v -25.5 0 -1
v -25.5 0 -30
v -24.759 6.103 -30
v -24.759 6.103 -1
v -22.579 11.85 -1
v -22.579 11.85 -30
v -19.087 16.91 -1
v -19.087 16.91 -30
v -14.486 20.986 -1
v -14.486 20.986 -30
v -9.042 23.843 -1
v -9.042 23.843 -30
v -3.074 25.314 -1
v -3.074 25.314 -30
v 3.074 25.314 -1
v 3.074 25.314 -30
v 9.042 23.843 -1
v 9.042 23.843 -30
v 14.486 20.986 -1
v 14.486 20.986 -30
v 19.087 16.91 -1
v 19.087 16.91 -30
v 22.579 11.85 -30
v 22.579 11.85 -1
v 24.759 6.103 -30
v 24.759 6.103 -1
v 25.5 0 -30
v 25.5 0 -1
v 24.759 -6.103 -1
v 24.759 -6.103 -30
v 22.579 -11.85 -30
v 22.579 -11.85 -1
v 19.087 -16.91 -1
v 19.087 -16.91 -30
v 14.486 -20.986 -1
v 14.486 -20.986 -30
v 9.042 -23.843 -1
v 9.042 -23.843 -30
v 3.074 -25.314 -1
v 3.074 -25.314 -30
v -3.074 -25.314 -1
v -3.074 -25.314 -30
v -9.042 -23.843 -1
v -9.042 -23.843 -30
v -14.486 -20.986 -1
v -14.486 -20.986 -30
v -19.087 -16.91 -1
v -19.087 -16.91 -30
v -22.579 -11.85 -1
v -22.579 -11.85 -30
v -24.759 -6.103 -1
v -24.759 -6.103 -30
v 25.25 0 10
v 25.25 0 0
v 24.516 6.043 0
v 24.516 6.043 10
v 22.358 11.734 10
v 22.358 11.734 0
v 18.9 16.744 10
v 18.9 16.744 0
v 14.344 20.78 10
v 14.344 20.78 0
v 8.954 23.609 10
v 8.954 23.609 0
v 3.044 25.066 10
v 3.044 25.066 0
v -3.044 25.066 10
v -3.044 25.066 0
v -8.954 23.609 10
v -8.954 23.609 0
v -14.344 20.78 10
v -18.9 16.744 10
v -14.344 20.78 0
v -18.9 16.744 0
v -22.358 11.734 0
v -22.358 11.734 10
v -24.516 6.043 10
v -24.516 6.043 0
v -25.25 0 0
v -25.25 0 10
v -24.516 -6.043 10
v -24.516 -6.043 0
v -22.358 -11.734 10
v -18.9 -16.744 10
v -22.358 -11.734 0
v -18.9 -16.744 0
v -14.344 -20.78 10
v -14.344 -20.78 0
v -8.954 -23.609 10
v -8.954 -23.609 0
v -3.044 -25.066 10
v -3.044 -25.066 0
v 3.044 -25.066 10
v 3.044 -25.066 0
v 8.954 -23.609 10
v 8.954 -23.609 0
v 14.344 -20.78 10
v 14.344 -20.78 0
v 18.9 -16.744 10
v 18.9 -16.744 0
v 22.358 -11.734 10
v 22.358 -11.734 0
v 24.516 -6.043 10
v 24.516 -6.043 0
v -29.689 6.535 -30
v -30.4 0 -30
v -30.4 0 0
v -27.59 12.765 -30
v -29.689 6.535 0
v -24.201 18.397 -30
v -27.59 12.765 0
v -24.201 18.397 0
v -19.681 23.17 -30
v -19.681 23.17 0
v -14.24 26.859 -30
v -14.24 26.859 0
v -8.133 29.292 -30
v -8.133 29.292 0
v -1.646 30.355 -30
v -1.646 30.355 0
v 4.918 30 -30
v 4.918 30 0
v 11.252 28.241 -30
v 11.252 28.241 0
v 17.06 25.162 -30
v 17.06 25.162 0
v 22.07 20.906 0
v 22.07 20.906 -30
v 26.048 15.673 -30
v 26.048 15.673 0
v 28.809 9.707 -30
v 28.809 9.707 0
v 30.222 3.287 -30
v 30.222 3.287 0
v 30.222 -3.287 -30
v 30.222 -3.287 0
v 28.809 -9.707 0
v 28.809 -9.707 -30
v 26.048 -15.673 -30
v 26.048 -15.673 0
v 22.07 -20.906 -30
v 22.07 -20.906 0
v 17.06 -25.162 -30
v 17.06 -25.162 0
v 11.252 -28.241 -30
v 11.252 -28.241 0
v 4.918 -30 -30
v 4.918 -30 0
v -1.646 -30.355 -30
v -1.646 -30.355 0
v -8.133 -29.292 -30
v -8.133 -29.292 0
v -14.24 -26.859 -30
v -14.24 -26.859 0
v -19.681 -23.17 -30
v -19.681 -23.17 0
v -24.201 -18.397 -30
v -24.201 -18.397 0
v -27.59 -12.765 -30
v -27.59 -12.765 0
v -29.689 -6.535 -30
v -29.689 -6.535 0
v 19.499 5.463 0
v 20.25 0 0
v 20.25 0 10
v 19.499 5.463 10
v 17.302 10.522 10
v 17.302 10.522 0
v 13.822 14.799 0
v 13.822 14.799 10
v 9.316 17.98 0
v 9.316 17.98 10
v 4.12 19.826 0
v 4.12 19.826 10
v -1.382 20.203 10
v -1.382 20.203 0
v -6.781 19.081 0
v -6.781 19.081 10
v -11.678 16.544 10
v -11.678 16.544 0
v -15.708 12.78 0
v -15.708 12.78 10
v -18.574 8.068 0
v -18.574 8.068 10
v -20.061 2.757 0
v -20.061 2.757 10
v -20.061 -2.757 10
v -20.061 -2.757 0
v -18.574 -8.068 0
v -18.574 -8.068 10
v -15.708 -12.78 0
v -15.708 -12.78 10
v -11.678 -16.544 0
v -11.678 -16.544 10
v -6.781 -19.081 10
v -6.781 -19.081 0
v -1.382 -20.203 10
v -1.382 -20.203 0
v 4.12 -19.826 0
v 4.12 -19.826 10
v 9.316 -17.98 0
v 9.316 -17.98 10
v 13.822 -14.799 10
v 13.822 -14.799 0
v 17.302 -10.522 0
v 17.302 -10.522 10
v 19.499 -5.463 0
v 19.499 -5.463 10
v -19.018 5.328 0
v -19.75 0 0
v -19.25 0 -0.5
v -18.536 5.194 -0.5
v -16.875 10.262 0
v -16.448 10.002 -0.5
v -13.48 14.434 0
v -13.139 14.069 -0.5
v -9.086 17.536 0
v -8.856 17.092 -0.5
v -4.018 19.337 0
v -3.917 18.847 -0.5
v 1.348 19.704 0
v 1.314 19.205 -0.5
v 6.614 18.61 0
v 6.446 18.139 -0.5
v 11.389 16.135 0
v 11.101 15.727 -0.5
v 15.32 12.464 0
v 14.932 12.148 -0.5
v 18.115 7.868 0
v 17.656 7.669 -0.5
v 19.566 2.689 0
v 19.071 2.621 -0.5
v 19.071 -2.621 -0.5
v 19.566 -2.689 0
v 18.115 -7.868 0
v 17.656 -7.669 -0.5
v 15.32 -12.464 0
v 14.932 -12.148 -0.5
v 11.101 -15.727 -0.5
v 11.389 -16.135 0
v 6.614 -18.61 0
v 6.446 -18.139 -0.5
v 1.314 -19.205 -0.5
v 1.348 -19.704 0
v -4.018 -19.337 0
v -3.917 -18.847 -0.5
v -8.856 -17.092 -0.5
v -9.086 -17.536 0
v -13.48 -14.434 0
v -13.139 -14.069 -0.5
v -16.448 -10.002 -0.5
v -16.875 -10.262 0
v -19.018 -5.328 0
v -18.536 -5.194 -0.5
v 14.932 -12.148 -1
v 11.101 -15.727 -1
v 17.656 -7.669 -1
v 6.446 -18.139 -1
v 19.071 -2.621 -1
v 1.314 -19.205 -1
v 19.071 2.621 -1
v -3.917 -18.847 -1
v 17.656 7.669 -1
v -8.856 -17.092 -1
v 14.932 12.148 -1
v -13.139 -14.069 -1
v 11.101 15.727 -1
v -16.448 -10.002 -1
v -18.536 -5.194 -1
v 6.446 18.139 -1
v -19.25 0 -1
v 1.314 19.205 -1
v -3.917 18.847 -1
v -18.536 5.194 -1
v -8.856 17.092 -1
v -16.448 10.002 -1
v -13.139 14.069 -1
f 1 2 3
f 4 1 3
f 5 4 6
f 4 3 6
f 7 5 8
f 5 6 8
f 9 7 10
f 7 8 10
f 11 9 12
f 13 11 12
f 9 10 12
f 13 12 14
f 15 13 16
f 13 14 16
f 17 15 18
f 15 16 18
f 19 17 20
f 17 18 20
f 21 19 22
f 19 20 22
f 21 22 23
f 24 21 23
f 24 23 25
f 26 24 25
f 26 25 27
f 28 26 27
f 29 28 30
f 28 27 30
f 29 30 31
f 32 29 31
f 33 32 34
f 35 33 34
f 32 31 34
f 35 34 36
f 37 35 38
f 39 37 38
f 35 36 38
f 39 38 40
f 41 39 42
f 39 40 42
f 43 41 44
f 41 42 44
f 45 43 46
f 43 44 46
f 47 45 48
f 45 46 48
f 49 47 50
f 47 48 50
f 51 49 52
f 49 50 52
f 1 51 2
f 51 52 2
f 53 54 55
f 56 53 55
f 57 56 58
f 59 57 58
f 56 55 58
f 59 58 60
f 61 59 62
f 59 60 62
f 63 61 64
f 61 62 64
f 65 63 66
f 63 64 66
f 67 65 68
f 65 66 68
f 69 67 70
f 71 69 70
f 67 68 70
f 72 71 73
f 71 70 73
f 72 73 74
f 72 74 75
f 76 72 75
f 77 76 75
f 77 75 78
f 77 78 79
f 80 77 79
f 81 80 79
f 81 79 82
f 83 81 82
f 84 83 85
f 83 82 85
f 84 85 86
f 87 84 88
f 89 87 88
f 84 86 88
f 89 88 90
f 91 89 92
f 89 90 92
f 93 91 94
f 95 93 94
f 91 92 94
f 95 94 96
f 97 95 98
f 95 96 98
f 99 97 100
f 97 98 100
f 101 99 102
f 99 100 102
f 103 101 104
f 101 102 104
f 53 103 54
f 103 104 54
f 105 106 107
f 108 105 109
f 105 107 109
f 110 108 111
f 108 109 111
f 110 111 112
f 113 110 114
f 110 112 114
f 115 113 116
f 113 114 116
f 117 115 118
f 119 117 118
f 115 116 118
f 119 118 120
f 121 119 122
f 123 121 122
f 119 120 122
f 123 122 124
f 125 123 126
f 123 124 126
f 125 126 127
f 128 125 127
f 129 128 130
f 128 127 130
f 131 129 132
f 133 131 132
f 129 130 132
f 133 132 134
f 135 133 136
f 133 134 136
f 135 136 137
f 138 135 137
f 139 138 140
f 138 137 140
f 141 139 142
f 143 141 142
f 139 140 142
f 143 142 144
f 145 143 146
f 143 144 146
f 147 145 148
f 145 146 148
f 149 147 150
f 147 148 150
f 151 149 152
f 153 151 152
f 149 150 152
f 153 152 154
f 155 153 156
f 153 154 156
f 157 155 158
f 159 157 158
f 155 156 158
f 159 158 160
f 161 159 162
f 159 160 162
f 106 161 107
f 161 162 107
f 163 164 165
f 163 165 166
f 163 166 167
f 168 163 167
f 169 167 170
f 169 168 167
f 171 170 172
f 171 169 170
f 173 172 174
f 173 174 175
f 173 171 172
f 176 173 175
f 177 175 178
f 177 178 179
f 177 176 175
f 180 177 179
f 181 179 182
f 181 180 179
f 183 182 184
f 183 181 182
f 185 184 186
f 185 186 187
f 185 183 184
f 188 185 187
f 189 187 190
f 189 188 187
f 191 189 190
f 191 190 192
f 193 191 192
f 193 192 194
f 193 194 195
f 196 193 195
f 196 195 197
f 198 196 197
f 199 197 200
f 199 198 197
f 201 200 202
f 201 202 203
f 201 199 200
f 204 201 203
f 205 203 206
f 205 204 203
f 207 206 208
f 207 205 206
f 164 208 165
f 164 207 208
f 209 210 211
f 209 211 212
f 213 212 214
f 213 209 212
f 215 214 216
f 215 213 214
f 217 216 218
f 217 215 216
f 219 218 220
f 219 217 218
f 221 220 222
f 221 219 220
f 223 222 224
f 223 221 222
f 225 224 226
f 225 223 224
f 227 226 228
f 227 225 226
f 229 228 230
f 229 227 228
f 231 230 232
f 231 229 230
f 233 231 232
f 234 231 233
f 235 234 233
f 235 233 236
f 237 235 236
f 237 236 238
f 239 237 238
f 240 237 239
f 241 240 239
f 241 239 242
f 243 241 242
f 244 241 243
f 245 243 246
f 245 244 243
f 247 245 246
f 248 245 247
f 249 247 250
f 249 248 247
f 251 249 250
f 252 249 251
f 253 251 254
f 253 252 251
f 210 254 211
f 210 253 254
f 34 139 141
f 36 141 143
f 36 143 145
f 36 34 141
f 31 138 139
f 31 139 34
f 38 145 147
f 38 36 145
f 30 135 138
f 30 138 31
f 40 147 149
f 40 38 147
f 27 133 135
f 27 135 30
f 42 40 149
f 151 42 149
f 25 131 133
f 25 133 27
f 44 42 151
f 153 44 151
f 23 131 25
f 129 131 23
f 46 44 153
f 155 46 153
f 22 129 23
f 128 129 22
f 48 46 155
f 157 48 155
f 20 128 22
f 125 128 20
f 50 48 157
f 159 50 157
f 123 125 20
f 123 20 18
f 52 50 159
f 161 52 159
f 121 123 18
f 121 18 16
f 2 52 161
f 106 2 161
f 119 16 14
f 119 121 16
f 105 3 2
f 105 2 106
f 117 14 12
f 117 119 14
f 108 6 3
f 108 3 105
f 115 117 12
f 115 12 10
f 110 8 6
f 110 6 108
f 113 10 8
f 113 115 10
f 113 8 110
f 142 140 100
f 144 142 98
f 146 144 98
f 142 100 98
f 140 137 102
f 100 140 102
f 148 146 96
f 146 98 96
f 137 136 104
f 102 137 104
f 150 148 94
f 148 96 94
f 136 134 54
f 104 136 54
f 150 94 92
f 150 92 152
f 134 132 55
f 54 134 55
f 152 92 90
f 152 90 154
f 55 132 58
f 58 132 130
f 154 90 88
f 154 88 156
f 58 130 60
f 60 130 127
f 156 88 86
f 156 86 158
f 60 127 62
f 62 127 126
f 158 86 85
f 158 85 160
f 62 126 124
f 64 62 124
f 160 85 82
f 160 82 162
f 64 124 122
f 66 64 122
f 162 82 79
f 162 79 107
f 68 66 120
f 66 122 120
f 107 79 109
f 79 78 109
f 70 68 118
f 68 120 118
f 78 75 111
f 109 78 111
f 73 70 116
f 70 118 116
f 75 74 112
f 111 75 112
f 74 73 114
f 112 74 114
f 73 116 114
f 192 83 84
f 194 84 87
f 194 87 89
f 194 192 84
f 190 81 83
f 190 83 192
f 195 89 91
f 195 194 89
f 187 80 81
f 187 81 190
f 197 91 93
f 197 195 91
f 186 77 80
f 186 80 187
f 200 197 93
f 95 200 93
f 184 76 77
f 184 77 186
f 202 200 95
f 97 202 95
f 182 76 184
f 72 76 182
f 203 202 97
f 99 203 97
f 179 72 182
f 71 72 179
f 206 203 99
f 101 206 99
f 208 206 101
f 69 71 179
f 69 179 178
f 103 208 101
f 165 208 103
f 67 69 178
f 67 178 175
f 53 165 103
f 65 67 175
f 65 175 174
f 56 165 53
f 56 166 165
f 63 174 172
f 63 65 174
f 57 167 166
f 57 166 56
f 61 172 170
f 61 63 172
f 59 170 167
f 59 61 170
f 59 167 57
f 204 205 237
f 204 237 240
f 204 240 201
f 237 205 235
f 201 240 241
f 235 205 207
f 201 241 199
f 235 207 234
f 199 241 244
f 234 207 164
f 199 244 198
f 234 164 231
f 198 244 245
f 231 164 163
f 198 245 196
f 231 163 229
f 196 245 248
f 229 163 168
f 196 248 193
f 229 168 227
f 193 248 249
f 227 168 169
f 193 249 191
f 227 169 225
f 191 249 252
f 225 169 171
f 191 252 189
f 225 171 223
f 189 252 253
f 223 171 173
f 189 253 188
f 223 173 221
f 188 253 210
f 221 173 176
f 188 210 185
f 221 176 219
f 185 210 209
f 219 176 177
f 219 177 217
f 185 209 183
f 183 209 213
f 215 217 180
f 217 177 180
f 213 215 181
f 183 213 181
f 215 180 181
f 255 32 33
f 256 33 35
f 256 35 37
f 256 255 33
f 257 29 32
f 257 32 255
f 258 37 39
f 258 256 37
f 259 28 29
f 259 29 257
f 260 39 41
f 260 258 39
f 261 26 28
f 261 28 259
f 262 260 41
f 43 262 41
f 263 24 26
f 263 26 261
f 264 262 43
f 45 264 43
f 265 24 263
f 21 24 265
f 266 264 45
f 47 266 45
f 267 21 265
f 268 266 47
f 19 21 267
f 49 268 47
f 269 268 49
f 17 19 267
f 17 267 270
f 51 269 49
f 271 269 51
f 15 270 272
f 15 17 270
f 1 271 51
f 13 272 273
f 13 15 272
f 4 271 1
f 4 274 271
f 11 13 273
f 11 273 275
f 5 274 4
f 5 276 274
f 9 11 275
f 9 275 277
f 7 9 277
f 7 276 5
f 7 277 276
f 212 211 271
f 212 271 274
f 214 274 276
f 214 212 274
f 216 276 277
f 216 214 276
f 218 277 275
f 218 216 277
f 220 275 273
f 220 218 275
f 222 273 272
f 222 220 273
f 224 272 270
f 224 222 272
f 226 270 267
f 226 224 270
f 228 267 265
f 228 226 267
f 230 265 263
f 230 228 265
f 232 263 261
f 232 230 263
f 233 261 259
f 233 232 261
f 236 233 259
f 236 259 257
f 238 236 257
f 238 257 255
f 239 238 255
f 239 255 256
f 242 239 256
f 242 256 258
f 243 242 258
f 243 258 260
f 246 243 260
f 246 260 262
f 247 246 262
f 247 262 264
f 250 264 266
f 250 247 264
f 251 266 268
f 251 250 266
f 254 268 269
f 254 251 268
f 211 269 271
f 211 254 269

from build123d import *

# Parameters (mm, degrees)
SKETCH2_R           = 25.25
SKETCH2_R_2         = 20.25
BOSS_EXTRUDE1_DEPTH = 10
SKETCH3_R           = 30.4
SKETCH3_R_2         = 19.25
BOSS_EXTRUDE2_DEPTH = 30
SKETCH4_R           = 25.5
CUT_EXTRUDE1_DEPTH  = 29
CHAMFER2_SIZE       = 0.5


with BuildPart() as part:
    # Sketch2 → Boss-Extrude1 (new body)
    with BuildSketch(Plane.XY):
        Circle(SKETCH2_R)
        Circle(SKETCH2_R_2, mode=Mode.SUBTRACT)
    extrude(amount=BOSS_EXTRUDE1_DEPTH)

    # Sketch3 → Boss-Extrude2 (add)
    with BuildSketch(Plane(origin=(0, 0, 0), x_dir=(-1, 0, 0), z_dir=(0, 0, -1))):
        Circle(SKETCH3_R)
        Circle(SKETCH3_R_2, mode=Mode.SUBTRACT)
    extrude(amount=BOSS_EXTRUDE2_DEPTH)

    # Sketch4 → Cut-Extrude1 (cut)
    with BuildSketch(Plane(origin=(0, 0, -30), x_dir=(-1, 0, 0), z_dir=(0, 0, -1))):
        Circle(SKETCH4_R)
    extrude(amount=-CUT_EXTRUDE1_DEPTH, mode=Mode.SUBTRACT)

    # Chamfer2
    chamfer2_edges = [part.edges().sort_by_distance(p)[0] for p in [
        (19.25, 0, 0),
    ]]
    chamfer(chamfer2_edges, length=CHAMFER2_SIZE)


solid = part.part
